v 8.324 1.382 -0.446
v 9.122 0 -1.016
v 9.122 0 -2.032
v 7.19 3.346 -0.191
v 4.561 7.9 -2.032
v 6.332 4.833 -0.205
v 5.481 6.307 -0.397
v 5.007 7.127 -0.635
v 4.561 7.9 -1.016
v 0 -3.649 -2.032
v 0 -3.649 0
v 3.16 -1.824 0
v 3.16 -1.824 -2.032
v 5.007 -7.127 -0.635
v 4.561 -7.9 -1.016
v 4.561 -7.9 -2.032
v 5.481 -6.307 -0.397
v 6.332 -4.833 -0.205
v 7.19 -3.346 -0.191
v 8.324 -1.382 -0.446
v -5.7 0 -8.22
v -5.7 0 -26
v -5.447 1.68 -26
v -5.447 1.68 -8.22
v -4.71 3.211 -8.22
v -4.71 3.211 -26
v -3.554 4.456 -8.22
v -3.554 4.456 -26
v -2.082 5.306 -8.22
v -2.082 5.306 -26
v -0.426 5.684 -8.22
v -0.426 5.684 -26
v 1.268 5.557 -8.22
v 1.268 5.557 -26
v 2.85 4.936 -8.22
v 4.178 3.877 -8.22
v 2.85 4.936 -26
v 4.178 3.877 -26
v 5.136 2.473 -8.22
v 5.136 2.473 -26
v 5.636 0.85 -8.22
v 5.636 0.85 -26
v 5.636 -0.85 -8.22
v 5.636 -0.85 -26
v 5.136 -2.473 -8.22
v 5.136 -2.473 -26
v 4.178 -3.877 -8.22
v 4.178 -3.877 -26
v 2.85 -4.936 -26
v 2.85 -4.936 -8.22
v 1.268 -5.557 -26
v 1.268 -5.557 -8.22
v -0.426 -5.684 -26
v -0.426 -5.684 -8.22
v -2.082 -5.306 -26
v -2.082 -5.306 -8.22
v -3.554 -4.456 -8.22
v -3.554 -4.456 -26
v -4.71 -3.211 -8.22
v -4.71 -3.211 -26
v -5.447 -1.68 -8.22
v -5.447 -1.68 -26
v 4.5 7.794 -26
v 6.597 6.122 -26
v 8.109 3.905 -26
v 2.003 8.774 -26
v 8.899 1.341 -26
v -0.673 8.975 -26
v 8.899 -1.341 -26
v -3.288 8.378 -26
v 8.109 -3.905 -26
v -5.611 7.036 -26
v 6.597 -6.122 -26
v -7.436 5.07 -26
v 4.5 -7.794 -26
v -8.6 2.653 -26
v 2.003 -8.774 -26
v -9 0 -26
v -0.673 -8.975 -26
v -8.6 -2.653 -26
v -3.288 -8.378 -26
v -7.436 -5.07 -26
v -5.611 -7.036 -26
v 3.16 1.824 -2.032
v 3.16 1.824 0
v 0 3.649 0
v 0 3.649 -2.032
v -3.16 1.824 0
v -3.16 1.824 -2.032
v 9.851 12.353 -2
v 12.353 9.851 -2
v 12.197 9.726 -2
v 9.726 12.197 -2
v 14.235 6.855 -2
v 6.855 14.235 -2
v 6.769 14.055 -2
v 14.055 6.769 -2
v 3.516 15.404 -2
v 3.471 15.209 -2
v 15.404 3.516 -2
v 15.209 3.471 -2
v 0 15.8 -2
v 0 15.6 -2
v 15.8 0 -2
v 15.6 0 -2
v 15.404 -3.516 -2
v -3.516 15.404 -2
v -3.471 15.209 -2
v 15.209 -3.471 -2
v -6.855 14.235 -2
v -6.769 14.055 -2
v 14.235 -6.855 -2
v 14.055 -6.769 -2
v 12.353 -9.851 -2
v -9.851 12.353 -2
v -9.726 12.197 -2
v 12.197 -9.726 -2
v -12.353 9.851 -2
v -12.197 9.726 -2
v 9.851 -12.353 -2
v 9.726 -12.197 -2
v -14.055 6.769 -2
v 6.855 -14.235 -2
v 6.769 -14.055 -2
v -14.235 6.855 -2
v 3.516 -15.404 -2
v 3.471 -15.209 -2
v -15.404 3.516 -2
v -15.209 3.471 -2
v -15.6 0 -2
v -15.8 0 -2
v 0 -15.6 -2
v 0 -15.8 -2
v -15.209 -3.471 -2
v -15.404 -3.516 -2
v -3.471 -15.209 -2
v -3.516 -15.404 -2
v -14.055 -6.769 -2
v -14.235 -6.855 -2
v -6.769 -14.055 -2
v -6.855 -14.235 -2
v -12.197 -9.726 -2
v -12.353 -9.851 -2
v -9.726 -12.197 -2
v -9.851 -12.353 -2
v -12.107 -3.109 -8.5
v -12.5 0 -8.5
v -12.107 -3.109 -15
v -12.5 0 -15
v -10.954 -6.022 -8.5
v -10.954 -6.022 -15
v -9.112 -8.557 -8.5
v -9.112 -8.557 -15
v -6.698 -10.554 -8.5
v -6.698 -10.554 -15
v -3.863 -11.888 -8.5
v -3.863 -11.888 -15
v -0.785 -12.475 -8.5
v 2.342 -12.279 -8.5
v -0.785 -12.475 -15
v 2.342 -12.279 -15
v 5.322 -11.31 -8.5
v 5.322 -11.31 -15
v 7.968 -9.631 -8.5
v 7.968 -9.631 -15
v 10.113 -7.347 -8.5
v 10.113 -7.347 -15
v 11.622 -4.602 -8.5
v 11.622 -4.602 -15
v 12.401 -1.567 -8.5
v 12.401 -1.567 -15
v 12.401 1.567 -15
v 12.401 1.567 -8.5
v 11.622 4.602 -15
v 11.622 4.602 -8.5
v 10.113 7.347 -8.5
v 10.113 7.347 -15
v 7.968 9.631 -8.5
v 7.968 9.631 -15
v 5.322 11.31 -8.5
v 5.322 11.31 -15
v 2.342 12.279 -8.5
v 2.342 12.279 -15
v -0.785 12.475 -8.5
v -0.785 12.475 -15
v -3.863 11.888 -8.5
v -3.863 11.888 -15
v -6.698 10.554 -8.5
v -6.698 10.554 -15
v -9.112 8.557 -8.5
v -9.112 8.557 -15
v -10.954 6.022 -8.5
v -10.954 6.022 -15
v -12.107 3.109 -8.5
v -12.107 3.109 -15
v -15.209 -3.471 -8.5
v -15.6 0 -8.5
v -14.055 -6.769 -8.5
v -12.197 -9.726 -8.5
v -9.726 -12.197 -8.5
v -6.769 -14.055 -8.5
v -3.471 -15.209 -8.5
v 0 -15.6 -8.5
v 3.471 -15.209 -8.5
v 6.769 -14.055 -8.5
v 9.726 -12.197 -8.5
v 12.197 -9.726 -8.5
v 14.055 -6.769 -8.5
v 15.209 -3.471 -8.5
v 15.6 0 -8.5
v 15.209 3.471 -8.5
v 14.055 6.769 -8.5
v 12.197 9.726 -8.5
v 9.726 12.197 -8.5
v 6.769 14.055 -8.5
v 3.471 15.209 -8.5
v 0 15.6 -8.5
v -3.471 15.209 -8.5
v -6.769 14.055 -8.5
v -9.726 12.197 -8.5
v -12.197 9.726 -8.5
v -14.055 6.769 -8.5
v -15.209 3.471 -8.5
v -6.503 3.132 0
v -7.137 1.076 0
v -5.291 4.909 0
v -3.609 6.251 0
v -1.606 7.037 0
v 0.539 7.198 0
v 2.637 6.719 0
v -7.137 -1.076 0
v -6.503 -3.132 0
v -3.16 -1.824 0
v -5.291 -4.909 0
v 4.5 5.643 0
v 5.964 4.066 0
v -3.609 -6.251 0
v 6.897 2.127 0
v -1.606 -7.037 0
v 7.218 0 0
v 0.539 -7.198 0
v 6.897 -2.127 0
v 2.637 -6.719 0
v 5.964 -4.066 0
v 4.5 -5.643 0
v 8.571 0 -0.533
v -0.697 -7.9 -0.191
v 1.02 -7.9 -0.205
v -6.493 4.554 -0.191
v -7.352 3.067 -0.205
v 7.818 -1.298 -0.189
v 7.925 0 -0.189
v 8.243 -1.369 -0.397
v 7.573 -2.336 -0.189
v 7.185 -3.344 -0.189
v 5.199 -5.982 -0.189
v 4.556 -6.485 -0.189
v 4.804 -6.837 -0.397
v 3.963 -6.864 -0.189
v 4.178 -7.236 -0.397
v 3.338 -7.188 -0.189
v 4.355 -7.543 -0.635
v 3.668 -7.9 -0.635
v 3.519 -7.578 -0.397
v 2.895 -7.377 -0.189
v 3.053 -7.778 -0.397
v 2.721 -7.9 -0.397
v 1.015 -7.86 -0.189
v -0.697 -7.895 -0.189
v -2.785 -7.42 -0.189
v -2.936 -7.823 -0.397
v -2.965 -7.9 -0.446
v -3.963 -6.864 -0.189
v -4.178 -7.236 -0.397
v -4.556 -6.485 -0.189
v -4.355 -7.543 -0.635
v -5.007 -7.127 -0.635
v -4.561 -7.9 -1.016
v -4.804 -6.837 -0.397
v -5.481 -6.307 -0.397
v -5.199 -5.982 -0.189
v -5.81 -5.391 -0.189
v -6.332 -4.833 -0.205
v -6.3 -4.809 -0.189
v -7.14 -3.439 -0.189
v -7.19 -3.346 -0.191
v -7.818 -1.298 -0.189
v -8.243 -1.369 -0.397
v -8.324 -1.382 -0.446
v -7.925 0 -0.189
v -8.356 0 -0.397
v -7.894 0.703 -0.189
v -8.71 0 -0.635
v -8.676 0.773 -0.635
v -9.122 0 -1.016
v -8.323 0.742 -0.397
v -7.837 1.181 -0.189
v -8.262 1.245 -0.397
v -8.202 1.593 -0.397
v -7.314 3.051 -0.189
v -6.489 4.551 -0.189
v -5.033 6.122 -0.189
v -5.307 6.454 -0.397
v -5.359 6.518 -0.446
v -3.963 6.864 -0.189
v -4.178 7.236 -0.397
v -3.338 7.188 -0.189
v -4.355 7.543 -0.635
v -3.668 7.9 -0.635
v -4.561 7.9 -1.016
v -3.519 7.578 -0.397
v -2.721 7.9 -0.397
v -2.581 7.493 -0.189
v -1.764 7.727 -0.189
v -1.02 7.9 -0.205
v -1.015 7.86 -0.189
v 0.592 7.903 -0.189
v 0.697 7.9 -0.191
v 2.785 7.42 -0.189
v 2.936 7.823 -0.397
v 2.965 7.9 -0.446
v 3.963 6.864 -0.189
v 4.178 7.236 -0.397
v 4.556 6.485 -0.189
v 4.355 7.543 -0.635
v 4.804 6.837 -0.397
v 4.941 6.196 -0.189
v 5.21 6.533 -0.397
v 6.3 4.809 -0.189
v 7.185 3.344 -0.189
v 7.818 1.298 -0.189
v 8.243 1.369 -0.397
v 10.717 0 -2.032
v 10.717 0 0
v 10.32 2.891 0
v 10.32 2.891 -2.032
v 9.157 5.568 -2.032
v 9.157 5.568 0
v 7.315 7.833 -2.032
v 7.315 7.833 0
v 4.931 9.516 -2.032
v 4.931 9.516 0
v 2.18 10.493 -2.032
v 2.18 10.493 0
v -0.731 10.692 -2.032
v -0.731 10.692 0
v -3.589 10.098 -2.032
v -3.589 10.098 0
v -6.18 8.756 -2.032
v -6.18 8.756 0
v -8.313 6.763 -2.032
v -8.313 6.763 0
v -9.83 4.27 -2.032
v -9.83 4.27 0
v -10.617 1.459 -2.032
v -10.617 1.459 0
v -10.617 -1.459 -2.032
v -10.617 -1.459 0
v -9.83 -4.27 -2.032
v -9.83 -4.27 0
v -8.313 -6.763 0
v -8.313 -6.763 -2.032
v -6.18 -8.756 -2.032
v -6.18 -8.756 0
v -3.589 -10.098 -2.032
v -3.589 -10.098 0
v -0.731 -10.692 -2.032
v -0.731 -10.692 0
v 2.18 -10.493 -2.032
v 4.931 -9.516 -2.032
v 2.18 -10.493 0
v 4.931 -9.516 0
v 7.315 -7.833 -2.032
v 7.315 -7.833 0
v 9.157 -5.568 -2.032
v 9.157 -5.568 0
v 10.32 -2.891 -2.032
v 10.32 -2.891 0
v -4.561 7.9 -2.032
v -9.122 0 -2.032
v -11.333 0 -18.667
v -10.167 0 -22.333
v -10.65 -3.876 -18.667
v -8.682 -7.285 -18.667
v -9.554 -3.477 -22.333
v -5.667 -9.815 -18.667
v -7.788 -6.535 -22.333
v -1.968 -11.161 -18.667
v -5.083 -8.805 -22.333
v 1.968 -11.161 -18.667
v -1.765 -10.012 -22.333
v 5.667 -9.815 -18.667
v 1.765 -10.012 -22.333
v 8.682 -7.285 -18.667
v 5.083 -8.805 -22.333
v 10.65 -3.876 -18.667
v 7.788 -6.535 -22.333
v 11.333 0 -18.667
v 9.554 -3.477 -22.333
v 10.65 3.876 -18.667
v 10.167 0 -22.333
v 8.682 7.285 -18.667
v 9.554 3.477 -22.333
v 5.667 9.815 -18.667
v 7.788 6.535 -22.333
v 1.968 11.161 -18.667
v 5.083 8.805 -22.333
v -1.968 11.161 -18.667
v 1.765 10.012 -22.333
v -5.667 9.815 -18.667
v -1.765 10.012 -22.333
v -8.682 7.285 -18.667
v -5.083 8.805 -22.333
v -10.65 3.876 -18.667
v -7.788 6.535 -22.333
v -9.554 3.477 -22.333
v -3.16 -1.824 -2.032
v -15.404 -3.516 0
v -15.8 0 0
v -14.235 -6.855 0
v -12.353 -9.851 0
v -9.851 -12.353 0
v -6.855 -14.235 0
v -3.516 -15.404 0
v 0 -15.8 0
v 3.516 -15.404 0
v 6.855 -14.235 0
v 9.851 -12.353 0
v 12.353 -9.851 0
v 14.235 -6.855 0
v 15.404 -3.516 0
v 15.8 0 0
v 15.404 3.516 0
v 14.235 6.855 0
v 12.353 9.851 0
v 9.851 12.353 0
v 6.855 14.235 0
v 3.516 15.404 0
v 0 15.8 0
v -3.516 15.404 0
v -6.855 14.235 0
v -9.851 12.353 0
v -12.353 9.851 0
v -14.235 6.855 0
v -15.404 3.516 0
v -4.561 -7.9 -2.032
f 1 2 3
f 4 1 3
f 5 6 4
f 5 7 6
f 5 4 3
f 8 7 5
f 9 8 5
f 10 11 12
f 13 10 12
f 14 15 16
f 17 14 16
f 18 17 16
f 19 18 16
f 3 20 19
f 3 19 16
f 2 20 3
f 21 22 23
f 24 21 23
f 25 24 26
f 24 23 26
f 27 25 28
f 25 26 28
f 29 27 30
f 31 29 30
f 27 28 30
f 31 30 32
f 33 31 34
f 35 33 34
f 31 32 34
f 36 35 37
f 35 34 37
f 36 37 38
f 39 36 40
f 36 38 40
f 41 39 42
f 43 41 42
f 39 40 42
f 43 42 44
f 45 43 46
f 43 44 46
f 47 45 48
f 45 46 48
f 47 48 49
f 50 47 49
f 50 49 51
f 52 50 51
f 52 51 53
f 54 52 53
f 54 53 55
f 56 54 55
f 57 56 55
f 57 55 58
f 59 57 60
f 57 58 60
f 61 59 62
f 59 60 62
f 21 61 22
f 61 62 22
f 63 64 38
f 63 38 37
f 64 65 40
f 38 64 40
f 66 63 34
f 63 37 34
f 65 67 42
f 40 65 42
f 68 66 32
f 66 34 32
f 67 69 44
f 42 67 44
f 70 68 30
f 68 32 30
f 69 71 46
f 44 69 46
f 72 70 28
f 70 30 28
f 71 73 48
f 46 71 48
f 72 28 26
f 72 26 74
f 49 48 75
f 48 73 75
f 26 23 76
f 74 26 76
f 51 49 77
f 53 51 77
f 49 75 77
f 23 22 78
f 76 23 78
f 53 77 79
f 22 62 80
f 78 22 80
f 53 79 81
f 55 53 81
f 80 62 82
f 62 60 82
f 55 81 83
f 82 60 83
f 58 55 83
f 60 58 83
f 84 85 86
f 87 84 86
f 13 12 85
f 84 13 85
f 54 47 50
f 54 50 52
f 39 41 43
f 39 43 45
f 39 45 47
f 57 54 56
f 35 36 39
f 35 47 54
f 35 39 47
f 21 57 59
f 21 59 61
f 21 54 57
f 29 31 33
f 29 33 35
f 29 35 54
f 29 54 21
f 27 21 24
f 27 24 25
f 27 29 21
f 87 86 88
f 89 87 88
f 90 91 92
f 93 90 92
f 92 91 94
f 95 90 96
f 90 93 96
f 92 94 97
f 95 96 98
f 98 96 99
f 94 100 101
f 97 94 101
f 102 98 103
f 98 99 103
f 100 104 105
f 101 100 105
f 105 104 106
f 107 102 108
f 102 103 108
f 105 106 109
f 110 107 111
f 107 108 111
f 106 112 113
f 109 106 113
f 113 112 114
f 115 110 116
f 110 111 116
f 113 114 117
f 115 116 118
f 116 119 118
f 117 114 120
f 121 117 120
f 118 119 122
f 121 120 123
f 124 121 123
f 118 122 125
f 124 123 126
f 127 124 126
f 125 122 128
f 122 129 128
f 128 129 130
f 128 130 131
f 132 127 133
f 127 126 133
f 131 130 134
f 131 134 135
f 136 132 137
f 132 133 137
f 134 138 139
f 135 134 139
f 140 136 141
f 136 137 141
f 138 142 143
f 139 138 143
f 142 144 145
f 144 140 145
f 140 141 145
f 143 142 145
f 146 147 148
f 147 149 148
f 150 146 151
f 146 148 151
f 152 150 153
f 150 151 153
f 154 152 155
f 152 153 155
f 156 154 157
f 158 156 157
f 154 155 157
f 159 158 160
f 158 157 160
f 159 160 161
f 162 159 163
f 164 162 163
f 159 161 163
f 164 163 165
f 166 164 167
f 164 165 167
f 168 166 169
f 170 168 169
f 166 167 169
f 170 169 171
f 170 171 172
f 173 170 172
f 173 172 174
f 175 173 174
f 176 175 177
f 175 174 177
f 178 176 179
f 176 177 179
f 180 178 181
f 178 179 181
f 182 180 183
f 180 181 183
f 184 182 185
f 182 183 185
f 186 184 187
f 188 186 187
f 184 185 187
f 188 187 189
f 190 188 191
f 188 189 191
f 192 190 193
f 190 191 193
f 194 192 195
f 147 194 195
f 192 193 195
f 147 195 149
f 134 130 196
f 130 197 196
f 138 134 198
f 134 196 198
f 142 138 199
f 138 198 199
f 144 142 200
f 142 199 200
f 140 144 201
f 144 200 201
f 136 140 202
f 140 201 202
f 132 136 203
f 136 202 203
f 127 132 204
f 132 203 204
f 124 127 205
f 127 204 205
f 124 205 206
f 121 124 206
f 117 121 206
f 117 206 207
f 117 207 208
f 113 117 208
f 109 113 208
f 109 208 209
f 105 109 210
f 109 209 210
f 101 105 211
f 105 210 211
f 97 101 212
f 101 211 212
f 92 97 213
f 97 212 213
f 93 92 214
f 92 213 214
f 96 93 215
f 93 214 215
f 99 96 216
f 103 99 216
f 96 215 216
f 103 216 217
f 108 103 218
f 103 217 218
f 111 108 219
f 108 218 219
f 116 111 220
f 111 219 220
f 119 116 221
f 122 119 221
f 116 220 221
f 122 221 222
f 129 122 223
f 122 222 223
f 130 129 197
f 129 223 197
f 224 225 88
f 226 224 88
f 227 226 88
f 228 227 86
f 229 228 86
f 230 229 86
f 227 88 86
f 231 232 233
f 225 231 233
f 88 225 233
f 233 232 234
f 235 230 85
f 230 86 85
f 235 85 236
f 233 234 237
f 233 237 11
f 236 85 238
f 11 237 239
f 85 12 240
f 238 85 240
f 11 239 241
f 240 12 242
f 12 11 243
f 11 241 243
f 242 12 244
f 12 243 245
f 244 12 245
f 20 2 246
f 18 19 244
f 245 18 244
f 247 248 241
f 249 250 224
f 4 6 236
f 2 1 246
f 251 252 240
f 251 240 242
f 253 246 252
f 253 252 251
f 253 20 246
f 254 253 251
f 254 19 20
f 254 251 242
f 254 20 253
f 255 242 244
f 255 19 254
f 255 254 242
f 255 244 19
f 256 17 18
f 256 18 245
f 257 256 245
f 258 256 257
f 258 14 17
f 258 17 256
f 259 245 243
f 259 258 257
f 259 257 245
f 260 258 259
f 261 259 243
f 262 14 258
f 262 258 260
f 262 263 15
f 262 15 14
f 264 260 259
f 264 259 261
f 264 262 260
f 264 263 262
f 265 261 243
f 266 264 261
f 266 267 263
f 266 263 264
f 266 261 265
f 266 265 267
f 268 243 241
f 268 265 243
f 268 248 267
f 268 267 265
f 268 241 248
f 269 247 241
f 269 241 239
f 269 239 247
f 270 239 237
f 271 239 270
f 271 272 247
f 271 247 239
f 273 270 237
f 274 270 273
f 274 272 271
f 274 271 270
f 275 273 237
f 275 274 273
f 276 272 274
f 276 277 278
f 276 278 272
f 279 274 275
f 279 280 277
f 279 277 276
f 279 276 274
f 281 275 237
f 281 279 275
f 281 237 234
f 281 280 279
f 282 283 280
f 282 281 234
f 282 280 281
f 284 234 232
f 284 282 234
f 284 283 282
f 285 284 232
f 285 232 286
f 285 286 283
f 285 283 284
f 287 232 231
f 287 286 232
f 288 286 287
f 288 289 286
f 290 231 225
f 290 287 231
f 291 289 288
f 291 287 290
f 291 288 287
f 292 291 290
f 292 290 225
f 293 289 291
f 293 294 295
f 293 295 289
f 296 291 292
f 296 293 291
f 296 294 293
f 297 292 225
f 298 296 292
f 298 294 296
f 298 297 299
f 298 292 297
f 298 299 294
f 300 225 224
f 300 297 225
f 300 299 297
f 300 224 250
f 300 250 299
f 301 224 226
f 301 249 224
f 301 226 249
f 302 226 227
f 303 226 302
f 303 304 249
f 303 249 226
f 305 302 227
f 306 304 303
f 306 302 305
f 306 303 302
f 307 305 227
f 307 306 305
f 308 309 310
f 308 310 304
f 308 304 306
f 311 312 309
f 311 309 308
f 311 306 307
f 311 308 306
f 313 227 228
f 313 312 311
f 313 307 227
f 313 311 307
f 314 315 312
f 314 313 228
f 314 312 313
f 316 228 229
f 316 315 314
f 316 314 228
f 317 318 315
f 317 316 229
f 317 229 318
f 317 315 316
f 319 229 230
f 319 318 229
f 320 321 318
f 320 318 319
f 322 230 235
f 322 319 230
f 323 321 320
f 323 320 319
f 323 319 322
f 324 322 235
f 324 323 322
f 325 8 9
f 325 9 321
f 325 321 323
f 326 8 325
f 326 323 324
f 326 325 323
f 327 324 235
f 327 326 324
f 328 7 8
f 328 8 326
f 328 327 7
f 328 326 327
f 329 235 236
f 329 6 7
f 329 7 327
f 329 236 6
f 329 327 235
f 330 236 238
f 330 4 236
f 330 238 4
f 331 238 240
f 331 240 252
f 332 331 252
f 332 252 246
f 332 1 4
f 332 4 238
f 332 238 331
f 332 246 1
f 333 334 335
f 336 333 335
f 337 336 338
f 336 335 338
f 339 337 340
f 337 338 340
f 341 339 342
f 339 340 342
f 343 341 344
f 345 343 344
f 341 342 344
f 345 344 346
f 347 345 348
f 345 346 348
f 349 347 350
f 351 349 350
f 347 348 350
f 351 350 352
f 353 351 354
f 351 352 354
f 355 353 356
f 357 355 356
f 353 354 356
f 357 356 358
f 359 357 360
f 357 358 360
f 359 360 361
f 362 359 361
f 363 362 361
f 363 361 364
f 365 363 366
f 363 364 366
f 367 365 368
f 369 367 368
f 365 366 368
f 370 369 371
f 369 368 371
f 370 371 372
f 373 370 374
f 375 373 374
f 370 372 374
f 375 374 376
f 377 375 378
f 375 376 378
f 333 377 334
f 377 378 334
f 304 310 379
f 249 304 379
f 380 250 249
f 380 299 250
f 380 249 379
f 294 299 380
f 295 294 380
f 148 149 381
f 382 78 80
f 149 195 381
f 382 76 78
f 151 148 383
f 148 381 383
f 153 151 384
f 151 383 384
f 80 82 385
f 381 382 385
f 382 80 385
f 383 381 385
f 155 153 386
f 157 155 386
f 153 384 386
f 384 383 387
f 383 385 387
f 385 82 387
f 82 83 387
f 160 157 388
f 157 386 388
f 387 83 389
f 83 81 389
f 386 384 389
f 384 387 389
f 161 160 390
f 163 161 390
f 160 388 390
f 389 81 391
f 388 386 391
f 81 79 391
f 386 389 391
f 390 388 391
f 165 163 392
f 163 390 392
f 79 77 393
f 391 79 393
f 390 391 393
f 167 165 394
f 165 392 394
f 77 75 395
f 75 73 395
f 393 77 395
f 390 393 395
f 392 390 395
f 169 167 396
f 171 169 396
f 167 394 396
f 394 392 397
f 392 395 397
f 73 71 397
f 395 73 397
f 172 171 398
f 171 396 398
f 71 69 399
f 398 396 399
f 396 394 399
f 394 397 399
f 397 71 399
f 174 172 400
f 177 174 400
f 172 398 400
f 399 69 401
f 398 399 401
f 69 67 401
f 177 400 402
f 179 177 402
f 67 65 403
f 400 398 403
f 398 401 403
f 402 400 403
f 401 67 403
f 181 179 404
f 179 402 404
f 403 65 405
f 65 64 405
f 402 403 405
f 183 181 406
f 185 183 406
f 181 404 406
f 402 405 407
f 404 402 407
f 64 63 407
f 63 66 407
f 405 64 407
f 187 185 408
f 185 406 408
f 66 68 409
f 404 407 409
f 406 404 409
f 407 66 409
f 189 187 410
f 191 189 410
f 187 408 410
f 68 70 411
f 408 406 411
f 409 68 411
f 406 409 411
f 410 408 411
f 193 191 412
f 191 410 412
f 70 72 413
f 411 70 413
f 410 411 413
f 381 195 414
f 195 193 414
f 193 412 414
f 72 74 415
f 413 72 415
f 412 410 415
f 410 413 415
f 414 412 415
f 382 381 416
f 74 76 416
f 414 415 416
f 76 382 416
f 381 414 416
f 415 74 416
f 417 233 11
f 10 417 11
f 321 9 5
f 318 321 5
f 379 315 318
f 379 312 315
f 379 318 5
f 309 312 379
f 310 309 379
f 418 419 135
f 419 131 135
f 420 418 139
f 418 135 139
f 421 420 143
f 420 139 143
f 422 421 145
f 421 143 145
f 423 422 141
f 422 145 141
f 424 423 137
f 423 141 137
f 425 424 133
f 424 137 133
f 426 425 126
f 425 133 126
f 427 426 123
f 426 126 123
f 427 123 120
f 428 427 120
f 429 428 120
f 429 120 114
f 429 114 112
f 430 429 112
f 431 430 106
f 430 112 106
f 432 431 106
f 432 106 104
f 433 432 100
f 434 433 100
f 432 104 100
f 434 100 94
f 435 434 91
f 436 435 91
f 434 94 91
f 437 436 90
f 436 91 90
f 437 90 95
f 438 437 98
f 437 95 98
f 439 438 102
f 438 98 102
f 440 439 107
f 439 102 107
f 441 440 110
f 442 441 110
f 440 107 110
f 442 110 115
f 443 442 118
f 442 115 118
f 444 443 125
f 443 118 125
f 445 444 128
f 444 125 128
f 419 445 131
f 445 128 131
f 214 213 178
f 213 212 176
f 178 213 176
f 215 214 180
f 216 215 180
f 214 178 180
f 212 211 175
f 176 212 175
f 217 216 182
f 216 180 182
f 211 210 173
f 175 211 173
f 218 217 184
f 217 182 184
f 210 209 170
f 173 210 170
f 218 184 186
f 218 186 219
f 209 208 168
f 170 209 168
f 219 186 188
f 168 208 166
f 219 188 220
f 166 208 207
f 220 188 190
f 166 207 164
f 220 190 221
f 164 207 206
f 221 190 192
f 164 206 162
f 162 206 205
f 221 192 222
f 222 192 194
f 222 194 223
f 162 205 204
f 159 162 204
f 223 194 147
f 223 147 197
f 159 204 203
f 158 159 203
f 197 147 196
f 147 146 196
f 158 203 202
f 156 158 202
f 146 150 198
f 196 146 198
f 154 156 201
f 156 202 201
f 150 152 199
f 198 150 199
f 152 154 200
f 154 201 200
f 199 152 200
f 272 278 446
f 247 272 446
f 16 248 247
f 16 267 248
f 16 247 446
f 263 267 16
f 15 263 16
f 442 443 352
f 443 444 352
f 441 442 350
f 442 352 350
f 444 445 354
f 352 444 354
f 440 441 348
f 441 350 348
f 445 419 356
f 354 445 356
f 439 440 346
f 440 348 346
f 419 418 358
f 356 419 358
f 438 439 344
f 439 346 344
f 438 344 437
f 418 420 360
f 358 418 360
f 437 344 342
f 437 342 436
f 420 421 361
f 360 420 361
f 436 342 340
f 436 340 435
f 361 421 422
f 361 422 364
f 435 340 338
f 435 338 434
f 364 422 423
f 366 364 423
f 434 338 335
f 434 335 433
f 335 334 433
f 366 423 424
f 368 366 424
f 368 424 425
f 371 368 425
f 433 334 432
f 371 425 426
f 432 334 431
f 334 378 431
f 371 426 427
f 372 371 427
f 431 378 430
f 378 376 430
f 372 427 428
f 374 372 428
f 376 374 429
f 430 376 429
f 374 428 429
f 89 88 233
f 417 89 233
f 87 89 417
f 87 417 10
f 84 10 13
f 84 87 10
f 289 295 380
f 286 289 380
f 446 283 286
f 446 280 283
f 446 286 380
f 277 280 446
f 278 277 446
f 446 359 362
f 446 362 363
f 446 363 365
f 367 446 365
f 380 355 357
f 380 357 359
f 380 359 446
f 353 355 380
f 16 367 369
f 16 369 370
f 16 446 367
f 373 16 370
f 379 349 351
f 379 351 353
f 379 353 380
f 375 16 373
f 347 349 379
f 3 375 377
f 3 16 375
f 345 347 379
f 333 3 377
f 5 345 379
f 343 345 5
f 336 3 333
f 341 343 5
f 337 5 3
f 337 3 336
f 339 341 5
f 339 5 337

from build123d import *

# Parameters (mm, degrees)
SKETCH2_R          = 5.7
CUT_EXTRUDE1_DEPTH = 17.78
SKETCH3_R          = 10.717201778
CUT_EXTRUDE2_DEPTH = 2.032
CUT_EXTRUDE3_DEPTH = 2.032


with BuildPart() as part:
    # Sketch1 → Revolve1 (revolve)
    with BuildSketch(Plane(origin=(0, 0, 0), x_dir=(0, 0, -1), z_dir=(1, 0, 0)), mode=Mode.PRIVATE) as revolve1_sk:
        Polygon((0, 0), (0, 15.800000023), (2, 15.800000023), (2, 15.600000023), (8.5, 15.600000023), (8.5, 12.5), (15, 12.5), (26, 9), (26, 0), align=None)
    revolve(revolve1_sk.sketch.rotate(Axis((0, 0, 0), (0, 0, 1)), 90), axis=Axis((0, 0, 0), (0, 0, 1)))

    # Sketch2 → Cut-Extrude1 (cut)
    with BuildSketch(Plane(origin=(0, 0, -26), x_dir=(-1, 0, 0), z_dir=(0, 0, -1))):
        Circle(SKETCH2_R)
    extrude(amount=-CUT_EXTRUDE1_DEPTH, mode=Mode.SUBTRACT)

    # Sketch3 → Cut-Extrude2 (cut)
    with BuildSketch(Plane.XY):
        Circle(SKETCH3_R)
        Polygon((4.561067127, 7.9), (-4.561067127, 7.9), (-9.122134253, 0), (-4.561067127, -7.9), (4.561067127, -7.9), (9.122134253, 0), align=None, mode=Mode.SUBTRACT)
    extrude(amount=-CUT_EXTRUDE2_DEPTH, mode=Mode.SUBTRACT)

    # Sketch4 → Cut-Revolve1 (revolve, cut)
    with BuildSketch(Plane(origin=(0, 0, 0), x_dir=(1, 0, 0), z_dir=(0, 1, 0)), mode=Mode.PRIVATE) as cut_revolve1_sk:
        with BuildLine():
            Line((-9.122134253, 1.016), (-9.122134253, 0))
            Line((-9.122134253, 0), (-7.217734963, 0))
            ThreePointArc((-7.217734963, 0), (-8.258276499, 0.342411186), (-9.122134253, 1.016))
        make_face()
    revolve(cut_revolve1_sk.sketch.rotate(Axis((0, 0, 0), (0, 0, -1)), 180), axis=Axis((0, 0, 0), (0, 0, -1)), mode=Mode.SUBTRACT)

    # Sketch5 → Cut-Extrude3 (cut)
    with BuildSketch(Plane.XY):
        Polygon((0, 3.648853701), (-3.16, 1.824426851), (-3.16, -1.824426851), (0, -3.648853701), (3.16, -1.824426851), (3.16, 1.824426851), align=None)
    extrude(amount=-CUT_EXTRUDE3_DEPTH, mode=Mode.SUBTRACT)


solid = part.part
